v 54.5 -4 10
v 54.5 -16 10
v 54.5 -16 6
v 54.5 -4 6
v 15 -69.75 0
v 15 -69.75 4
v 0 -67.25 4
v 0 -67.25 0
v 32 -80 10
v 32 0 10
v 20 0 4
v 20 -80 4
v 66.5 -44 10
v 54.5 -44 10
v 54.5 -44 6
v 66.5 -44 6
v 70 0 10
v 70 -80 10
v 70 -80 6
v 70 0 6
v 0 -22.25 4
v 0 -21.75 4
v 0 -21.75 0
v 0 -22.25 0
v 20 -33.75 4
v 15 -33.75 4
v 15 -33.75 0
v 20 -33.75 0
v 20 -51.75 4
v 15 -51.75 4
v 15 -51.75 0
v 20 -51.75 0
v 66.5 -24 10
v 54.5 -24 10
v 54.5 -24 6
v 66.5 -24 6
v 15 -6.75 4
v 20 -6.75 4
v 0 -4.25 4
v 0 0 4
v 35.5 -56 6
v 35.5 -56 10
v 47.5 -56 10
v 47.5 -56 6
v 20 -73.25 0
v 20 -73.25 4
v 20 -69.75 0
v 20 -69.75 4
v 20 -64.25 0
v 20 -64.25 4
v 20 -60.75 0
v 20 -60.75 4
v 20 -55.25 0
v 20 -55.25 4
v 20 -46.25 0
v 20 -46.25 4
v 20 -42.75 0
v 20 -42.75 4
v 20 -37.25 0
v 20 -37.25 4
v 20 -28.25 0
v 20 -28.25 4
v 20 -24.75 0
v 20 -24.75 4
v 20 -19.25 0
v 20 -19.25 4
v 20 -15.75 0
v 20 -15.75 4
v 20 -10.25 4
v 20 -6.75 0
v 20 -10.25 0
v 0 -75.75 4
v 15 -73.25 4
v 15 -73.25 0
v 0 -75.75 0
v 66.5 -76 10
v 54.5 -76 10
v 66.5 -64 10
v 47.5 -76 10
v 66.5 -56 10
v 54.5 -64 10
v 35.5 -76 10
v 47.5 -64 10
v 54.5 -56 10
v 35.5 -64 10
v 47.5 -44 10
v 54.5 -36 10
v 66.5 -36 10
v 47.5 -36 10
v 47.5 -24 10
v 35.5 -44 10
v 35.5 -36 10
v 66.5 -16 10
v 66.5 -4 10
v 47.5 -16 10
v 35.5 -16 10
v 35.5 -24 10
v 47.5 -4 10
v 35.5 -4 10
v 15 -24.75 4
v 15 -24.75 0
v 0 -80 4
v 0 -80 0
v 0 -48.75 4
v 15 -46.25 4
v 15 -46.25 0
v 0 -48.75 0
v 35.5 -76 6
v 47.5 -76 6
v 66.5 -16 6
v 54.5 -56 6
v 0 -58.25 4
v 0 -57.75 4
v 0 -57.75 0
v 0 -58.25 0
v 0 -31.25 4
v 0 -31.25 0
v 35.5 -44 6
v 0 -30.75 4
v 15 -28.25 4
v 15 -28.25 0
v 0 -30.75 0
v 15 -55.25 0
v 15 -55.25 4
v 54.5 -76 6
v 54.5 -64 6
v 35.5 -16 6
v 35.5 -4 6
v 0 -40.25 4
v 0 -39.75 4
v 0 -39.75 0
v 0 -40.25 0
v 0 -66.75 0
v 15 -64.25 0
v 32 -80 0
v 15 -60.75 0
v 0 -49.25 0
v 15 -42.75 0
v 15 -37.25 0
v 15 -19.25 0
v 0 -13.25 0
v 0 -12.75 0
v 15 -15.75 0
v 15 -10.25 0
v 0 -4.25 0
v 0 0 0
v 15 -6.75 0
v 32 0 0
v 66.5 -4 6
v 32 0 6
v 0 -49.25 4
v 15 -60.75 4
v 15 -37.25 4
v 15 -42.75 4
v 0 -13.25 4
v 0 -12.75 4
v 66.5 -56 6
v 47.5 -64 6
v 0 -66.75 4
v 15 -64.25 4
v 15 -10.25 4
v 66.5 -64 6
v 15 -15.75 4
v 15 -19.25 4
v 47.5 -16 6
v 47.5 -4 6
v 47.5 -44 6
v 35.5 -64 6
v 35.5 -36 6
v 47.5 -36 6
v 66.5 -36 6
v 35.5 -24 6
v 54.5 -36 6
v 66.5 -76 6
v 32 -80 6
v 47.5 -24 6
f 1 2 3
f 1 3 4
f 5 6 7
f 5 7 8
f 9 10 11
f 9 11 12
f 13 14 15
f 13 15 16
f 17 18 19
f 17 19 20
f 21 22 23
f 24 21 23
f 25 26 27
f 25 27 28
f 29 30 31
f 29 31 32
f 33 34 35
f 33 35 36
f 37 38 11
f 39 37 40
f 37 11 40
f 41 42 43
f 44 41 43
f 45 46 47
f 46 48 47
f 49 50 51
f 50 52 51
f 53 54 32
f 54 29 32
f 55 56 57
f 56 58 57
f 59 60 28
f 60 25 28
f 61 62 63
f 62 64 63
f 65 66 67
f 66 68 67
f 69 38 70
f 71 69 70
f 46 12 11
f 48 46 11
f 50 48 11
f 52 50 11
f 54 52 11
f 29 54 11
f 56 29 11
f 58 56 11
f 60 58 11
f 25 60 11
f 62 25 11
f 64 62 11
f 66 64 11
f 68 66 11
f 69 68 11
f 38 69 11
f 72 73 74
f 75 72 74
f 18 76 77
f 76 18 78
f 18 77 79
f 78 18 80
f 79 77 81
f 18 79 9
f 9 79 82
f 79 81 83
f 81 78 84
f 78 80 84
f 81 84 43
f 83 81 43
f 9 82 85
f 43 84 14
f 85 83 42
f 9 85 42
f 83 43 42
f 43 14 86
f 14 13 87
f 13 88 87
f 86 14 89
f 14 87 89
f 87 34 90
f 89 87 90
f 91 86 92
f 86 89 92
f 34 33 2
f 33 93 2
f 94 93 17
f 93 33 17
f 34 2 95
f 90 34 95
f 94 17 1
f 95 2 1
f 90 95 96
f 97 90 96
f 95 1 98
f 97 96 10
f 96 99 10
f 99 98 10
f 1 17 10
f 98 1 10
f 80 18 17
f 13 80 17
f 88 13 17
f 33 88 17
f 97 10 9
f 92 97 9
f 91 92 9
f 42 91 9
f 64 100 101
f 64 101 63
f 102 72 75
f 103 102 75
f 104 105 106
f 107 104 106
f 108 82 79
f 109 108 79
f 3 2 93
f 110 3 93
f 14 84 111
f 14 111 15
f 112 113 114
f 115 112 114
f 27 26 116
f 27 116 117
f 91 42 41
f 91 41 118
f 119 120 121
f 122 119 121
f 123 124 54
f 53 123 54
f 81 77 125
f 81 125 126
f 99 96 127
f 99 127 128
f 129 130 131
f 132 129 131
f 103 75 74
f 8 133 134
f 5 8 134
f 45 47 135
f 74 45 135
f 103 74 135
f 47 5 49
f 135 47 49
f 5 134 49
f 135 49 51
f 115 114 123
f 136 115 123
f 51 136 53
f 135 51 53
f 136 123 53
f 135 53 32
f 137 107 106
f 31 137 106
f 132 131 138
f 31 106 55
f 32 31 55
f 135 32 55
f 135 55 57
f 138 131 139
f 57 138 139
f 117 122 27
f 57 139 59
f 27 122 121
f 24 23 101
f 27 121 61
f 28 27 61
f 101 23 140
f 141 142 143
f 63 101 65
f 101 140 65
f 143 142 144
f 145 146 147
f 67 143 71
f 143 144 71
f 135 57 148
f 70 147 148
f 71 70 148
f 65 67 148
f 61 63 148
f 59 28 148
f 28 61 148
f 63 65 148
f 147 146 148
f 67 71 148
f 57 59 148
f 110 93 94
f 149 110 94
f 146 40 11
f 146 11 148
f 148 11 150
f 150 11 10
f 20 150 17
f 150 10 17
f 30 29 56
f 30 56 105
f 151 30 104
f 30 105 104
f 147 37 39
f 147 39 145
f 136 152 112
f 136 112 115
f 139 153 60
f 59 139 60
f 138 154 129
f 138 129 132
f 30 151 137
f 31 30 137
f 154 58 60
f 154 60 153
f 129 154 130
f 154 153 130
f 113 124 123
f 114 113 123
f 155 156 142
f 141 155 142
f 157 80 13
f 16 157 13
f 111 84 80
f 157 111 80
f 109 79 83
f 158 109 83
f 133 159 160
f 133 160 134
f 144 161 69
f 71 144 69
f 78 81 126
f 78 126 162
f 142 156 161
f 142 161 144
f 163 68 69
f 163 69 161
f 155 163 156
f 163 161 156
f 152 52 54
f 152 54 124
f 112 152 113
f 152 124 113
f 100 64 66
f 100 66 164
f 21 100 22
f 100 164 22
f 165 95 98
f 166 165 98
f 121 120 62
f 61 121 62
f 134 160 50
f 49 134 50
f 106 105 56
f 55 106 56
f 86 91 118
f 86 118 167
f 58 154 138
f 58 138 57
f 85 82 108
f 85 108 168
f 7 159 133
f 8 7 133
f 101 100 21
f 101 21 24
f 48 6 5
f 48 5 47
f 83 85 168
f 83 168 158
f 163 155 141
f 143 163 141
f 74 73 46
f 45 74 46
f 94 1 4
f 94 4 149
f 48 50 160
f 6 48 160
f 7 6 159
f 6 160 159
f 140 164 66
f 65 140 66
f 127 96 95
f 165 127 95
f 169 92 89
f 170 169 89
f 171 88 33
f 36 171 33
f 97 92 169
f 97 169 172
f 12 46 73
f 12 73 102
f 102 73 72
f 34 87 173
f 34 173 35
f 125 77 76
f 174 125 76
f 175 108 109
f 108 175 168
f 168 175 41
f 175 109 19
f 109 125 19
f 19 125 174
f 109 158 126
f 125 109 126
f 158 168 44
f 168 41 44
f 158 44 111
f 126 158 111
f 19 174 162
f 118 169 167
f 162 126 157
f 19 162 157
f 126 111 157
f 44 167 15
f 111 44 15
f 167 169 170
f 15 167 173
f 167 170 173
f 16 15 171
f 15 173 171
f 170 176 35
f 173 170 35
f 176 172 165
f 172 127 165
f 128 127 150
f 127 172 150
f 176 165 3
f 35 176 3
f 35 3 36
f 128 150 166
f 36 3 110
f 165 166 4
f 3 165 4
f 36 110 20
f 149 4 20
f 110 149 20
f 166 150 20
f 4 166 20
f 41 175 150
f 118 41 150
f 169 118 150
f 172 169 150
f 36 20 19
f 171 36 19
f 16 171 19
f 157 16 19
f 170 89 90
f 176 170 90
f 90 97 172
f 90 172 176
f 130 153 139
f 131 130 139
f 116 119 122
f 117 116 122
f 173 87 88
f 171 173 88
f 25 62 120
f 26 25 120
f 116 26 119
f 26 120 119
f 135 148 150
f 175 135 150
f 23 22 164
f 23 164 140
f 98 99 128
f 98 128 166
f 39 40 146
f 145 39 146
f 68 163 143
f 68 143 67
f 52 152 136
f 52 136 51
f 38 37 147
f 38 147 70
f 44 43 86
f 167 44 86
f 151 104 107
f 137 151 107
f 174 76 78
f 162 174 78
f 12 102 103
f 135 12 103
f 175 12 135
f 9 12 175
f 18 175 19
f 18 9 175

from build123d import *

# Parameters (mm, degrees)
F1_DEPTH   = 80
F2_W       = 20
F2_H       = 3.5
F3_DEPTH   = 4.001
F4_SIZE2   = 11.99999
F4_SIZE    = 5.99999
F5_SIZE2   = 2.5
F5_SIZE    = 15
F5_2_SIZE2 = 2.5
F5_2_SIZE  = 15
F5_3_SIZE2 = 2.5
F5_3_SIZE  = 15
F5_4_SIZE2 = 2.5
F5_4_SIZE  = 15
F5_5_SIZE2 = 2.5
F5_5_SIZE  = 15
F5_6_SIZE2 = 2.5
F5_6_SIZE  = 15
F5_7_SIZE2 = 2.5
F5_7_SIZE  = 15
F5_8_SIZE2 = 2.5
F5_8_SIZE  = 15
F6_SIZE2   = 2.5
F6_SIZE    = 15
F6_2_SIZE2 = 2.5
F6_2_SIZE  = 15
F6_3_SIZE2 = 2.5
F6_3_SIZE  = 15
F6_4_SIZE2 = 2.5
F6_4_SIZE  = 15
F6_5_SIZE2 = 2.5
F6_5_SIZE  = 15
F6_6_SIZE2 = 2.5
F6_6_SIZE  = 15
F6_7_SIZE2 = 2.5
F6_7_SIZE  = 15
F6_8_SIZE2 = 2.5
F6_8_SIZE  = 15
F7_W       = 30
F7_H       = 80
F8_DEPTH   = 25
F9_W       = 12
F9_H       = 12
F10_DEPTH  = 10.001


# Not quite as in the source:
# - a fillet or chamfer is up to 0.001 mm smaller than in the source, because OpenCascade refuses the exact size


with BuildPart() as f1:
    # F0 (on Front) → F1 (new body)
    with BuildSketch(Plane.XZ):
        Polygon((0, 4), (0, 0), (32, 0), (32, 6), (100, 6), (100, 10), (20, 10), (20, 4), align=None)
    extrude(amount=F1_DEPTH)

    # F2 (on face) → F3 (cut, through all)
    with BuildSketch(Plane.XY.offset(4)):
        with Locations((10, -35.5)):
            Rectangle(F2_W, F2_H)
        with Locations((10, -26.5)):
            Rectangle(F2_W, F2_H)
        with Locations((10, -17.5)):
            Rectangle(F2_W, F2_H)
        with Locations((10, -8.5)):
            Rectangle(F2_W, F2_H)
        with Locations((10, -71.5)):
            Rectangle(F2_W, F2_H)
        with Locations((10, -53.5)):
            Rectangle(F2_W, F2_H)
        with Locations((10, -44.5)):
            Rectangle(F2_W, F2_H)
        with Locations((10, -62.5)):
            Rectangle(F2_W, F2_H)
    extrude(amount=-F3_DEPTH, mode=Mode.SUBTRACT)

    # F4 (size 6 and 12 in the source; OpenCascade refuses exactly that, so slightly less here)
    f4_edges = [f1.edges().sort_by_distance(p)[0] for p in [
        (20, -40, 10),
    ]]
    f4_side = f1.faces().sort_by_distance((20, -40, 6.054054))[0]
    chamfer(f4_edges, length=F4_SIZE, length2=F4_SIZE2, reference=f4_side)

    # F5
    f5_edges = [f1.edges().sort_by_distance(p)[0] for p in [
        (0, -6.75, 2),
    ]]
    f5_side = f1.faces().sort_by_distance((10, -6.75, 2))[0]
    chamfer(f5_edges, length=F5_SIZE, length2=F5_SIZE2, reference=f5_side)

    # F5#2
    f5_2_edges = [f1.edges().sort_by_distance(p)[0] for p in [
        (0, -69.75, 2),
    ]]
    f5_2_side = f1.faces().sort_by_distance((10, -69.75, 2))[0]
    chamfer(f5_2_edges, length=F5_2_SIZE, length2=F5_2_SIZE2, reference=f5_2_side)

    # F5#3
    f5_3_edges = [f1.edges().sort_by_distance(p)[0] for p in [
        (0, -15.75, 2),
    ]]
    f5_3_side = f1.faces().sort_by_distance((10, -15.75, 2))[0]
    chamfer(f5_3_edges, length=F5_3_SIZE, length2=F5_3_SIZE2, reference=f5_3_side)

    # F5#4
    f5_4_edges = [f1.edges().sort_by_distance(p)[0] for p in [
        (0, -60.75, 2),
    ]]
    f5_4_side = f1.faces().sort_by_distance((10, -60.75, 2))[0]
    chamfer(f5_4_edges, length=F5_4_SIZE, length2=F5_4_SIZE2, reference=f5_4_side)

    # F5#5
    f5_5_edges = [f1.edges().sort_by_distance(p)[0] for p in [
        (0, -24.75, 2),
    ]]
    f5_5_side = f1.faces().sort_by_distance((10, -24.75, 2))[0]
    chamfer(f5_5_edges, length=F5_5_SIZE, length2=F5_5_SIZE2, reference=f5_5_side)

    # F5#6
    f5_6_edges = [f1.edges().sort_by_distance(p)[0] for p in [
        (0, -51.75, 2),
    ]]
    f5_6_side = f1.faces().sort_by_distance((10, -51.75, 2))[0]
    chamfer(f5_6_edges, length=F5_6_SIZE, length2=F5_6_SIZE2, reference=f5_6_side)

    # F5#7
    f5_7_edges = [f1.edges().sort_by_distance(p)[0] for p in [
        (0, -33.75, 2),
    ]]
    f5_7_side = f1.faces().sort_by_distance((10, -33.75, 2))[0]
    chamfer(f5_7_edges, length=F5_7_SIZE, length2=F5_7_SIZE2, reference=f5_7_side)

    # F5#8
    f5_8_edges = [f1.edges().sort_by_distance(p)[0] for p in [
        (0, -42.75, 2),
    ]]
    f5_8_side = f1.faces().sort_by_distance((10, -42.75, 2))[0]
    chamfer(f5_8_edges, length=F5_8_SIZE, length2=F5_8_SIZE2, reference=f5_8_side)

    # F6
    f6_edges = [f1.edges().sort_by_distance(p)[0] for p in [
        (0, -37.25, 2),
    ]]
    f6_side = f1.faces().sort_by_distance((10, -37.25, 2))[0]
    chamfer(f6_edges, length=F6_SIZE, length2=F6_SIZE2, reference=f6_side)

    # F6#2
    f6_2_edges = [f1.edges().sort_by_distance(p)[0] for p in [
        (0, -46.25, 2),
    ]]
    f6_2_side = f1.faces().sort_by_distance((10, -46.25, 2))[0]
    chamfer(f6_2_edges, length=F6_2_SIZE, length2=F6_2_SIZE2, reference=f6_2_side)

    # F6#3
    f6_3_edges = [f1.edges().sort_by_distance(p)[0] for p in [
        (0, -28.25, 2),
    ]]
    f6_3_side = f1.faces().sort_by_distance((10, -28.25, 2))[0]
    chamfer(f6_3_edges, length=F6_3_SIZE, length2=F6_3_SIZE2, reference=f6_3_side)

    # F6#4
    f6_4_edges = [f1.edges().sort_by_distance(p)[0] for p in [
        (0, -55.25, 2),
    ]]
    f6_4_side = f1.faces().sort_by_distance((10, -55.25, 2))[0]
    chamfer(f6_4_edges, length=F6_4_SIZE, length2=F6_4_SIZE2, reference=f6_4_side)

    # F6#5
    f6_5_edges = [f1.edges().sort_by_distance(p)[0] for p in [
        (0, -19.25, 2),
    ]]
    f6_5_side = f1.faces().sort_by_distance((10, -19.25, 2))[0]
    chamfer(f6_5_edges, length=F6_5_SIZE, length2=F6_5_SIZE2, reference=f6_5_side)

    # F6#6
    f6_6_edges = [f1.edges().sort_by_distance(p)[0] for p in [
        (0, -64.25, 2),
    ]]
    f6_6_side = f1.faces().sort_by_distance((10, -64.25, 2))[0]
    chamfer(f6_6_edges, length=F6_6_SIZE, length2=F6_6_SIZE2, reference=f6_6_side)

    # F6#7
    f6_7_edges = [f1.edges().sort_by_distance(p)[0] for p in [
        (0, -10.25, 2),
    ]]
    f6_7_side = f1.faces().sort_by_distance((10, -10.25, 2))[0]
    chamfer(f6_7_edges, length=F6_7_SIZE, length2=F6_7_SIZE2, reference=f6_7_side)

    # F6#8
    f6_8_edges = [f1.edges().sort_by_distance(p)[0] for p in [
        (0, -73.25, 2),
    ]]
    f6_8_side = f1.faces().sort_by_distance((10, -73.25, 2))[0]
    chamfer(f6_8_edges, length=F6_8_SIZE, length2=F6_8_SIZE2, reference=f6_8_side)

    # F7 (on face) → F8 (cut)
    with BuildSketch(Plane.XY.offset(10)):
        with Locations((85, -40)):
            Rectangle(F7_W, F7_H)
    extrude(amount=-F8_DEPTH, mode=Mode.SUBTRACT)

    # F9 (on face) → F10 (cut, through all)
    with BuildSketch(Plane.XY.offset(10)):
        with Locations((41.5, -10)):
            Rectangle(F9_W, F9_H)
        with Locations((41.5, -30)):
            Rectangle(F9_W, F9_H)
        with Locations((41.5, -50)):
            Rectangle(F9_W, F9_H)
        with Locations((41.5, -70)):
            Rectangle(F9_W, F9_H)
        with Locations((60.5, -30)):
            Rectangle(F9_W, F9_H)
        with Locations((60.5, -70)):
            Rectangle(F9_W, F9_H)
        with Locations((60.5, -10)):
            Rectangle(F9_W, F9_H)
        with Locations((60.5, -50)):
            Rectangle(F9_W, F9_H)
    extrude(amount=-F10_DEPTH, mode=Mode.SUBTRACT)


solid = f1.part
